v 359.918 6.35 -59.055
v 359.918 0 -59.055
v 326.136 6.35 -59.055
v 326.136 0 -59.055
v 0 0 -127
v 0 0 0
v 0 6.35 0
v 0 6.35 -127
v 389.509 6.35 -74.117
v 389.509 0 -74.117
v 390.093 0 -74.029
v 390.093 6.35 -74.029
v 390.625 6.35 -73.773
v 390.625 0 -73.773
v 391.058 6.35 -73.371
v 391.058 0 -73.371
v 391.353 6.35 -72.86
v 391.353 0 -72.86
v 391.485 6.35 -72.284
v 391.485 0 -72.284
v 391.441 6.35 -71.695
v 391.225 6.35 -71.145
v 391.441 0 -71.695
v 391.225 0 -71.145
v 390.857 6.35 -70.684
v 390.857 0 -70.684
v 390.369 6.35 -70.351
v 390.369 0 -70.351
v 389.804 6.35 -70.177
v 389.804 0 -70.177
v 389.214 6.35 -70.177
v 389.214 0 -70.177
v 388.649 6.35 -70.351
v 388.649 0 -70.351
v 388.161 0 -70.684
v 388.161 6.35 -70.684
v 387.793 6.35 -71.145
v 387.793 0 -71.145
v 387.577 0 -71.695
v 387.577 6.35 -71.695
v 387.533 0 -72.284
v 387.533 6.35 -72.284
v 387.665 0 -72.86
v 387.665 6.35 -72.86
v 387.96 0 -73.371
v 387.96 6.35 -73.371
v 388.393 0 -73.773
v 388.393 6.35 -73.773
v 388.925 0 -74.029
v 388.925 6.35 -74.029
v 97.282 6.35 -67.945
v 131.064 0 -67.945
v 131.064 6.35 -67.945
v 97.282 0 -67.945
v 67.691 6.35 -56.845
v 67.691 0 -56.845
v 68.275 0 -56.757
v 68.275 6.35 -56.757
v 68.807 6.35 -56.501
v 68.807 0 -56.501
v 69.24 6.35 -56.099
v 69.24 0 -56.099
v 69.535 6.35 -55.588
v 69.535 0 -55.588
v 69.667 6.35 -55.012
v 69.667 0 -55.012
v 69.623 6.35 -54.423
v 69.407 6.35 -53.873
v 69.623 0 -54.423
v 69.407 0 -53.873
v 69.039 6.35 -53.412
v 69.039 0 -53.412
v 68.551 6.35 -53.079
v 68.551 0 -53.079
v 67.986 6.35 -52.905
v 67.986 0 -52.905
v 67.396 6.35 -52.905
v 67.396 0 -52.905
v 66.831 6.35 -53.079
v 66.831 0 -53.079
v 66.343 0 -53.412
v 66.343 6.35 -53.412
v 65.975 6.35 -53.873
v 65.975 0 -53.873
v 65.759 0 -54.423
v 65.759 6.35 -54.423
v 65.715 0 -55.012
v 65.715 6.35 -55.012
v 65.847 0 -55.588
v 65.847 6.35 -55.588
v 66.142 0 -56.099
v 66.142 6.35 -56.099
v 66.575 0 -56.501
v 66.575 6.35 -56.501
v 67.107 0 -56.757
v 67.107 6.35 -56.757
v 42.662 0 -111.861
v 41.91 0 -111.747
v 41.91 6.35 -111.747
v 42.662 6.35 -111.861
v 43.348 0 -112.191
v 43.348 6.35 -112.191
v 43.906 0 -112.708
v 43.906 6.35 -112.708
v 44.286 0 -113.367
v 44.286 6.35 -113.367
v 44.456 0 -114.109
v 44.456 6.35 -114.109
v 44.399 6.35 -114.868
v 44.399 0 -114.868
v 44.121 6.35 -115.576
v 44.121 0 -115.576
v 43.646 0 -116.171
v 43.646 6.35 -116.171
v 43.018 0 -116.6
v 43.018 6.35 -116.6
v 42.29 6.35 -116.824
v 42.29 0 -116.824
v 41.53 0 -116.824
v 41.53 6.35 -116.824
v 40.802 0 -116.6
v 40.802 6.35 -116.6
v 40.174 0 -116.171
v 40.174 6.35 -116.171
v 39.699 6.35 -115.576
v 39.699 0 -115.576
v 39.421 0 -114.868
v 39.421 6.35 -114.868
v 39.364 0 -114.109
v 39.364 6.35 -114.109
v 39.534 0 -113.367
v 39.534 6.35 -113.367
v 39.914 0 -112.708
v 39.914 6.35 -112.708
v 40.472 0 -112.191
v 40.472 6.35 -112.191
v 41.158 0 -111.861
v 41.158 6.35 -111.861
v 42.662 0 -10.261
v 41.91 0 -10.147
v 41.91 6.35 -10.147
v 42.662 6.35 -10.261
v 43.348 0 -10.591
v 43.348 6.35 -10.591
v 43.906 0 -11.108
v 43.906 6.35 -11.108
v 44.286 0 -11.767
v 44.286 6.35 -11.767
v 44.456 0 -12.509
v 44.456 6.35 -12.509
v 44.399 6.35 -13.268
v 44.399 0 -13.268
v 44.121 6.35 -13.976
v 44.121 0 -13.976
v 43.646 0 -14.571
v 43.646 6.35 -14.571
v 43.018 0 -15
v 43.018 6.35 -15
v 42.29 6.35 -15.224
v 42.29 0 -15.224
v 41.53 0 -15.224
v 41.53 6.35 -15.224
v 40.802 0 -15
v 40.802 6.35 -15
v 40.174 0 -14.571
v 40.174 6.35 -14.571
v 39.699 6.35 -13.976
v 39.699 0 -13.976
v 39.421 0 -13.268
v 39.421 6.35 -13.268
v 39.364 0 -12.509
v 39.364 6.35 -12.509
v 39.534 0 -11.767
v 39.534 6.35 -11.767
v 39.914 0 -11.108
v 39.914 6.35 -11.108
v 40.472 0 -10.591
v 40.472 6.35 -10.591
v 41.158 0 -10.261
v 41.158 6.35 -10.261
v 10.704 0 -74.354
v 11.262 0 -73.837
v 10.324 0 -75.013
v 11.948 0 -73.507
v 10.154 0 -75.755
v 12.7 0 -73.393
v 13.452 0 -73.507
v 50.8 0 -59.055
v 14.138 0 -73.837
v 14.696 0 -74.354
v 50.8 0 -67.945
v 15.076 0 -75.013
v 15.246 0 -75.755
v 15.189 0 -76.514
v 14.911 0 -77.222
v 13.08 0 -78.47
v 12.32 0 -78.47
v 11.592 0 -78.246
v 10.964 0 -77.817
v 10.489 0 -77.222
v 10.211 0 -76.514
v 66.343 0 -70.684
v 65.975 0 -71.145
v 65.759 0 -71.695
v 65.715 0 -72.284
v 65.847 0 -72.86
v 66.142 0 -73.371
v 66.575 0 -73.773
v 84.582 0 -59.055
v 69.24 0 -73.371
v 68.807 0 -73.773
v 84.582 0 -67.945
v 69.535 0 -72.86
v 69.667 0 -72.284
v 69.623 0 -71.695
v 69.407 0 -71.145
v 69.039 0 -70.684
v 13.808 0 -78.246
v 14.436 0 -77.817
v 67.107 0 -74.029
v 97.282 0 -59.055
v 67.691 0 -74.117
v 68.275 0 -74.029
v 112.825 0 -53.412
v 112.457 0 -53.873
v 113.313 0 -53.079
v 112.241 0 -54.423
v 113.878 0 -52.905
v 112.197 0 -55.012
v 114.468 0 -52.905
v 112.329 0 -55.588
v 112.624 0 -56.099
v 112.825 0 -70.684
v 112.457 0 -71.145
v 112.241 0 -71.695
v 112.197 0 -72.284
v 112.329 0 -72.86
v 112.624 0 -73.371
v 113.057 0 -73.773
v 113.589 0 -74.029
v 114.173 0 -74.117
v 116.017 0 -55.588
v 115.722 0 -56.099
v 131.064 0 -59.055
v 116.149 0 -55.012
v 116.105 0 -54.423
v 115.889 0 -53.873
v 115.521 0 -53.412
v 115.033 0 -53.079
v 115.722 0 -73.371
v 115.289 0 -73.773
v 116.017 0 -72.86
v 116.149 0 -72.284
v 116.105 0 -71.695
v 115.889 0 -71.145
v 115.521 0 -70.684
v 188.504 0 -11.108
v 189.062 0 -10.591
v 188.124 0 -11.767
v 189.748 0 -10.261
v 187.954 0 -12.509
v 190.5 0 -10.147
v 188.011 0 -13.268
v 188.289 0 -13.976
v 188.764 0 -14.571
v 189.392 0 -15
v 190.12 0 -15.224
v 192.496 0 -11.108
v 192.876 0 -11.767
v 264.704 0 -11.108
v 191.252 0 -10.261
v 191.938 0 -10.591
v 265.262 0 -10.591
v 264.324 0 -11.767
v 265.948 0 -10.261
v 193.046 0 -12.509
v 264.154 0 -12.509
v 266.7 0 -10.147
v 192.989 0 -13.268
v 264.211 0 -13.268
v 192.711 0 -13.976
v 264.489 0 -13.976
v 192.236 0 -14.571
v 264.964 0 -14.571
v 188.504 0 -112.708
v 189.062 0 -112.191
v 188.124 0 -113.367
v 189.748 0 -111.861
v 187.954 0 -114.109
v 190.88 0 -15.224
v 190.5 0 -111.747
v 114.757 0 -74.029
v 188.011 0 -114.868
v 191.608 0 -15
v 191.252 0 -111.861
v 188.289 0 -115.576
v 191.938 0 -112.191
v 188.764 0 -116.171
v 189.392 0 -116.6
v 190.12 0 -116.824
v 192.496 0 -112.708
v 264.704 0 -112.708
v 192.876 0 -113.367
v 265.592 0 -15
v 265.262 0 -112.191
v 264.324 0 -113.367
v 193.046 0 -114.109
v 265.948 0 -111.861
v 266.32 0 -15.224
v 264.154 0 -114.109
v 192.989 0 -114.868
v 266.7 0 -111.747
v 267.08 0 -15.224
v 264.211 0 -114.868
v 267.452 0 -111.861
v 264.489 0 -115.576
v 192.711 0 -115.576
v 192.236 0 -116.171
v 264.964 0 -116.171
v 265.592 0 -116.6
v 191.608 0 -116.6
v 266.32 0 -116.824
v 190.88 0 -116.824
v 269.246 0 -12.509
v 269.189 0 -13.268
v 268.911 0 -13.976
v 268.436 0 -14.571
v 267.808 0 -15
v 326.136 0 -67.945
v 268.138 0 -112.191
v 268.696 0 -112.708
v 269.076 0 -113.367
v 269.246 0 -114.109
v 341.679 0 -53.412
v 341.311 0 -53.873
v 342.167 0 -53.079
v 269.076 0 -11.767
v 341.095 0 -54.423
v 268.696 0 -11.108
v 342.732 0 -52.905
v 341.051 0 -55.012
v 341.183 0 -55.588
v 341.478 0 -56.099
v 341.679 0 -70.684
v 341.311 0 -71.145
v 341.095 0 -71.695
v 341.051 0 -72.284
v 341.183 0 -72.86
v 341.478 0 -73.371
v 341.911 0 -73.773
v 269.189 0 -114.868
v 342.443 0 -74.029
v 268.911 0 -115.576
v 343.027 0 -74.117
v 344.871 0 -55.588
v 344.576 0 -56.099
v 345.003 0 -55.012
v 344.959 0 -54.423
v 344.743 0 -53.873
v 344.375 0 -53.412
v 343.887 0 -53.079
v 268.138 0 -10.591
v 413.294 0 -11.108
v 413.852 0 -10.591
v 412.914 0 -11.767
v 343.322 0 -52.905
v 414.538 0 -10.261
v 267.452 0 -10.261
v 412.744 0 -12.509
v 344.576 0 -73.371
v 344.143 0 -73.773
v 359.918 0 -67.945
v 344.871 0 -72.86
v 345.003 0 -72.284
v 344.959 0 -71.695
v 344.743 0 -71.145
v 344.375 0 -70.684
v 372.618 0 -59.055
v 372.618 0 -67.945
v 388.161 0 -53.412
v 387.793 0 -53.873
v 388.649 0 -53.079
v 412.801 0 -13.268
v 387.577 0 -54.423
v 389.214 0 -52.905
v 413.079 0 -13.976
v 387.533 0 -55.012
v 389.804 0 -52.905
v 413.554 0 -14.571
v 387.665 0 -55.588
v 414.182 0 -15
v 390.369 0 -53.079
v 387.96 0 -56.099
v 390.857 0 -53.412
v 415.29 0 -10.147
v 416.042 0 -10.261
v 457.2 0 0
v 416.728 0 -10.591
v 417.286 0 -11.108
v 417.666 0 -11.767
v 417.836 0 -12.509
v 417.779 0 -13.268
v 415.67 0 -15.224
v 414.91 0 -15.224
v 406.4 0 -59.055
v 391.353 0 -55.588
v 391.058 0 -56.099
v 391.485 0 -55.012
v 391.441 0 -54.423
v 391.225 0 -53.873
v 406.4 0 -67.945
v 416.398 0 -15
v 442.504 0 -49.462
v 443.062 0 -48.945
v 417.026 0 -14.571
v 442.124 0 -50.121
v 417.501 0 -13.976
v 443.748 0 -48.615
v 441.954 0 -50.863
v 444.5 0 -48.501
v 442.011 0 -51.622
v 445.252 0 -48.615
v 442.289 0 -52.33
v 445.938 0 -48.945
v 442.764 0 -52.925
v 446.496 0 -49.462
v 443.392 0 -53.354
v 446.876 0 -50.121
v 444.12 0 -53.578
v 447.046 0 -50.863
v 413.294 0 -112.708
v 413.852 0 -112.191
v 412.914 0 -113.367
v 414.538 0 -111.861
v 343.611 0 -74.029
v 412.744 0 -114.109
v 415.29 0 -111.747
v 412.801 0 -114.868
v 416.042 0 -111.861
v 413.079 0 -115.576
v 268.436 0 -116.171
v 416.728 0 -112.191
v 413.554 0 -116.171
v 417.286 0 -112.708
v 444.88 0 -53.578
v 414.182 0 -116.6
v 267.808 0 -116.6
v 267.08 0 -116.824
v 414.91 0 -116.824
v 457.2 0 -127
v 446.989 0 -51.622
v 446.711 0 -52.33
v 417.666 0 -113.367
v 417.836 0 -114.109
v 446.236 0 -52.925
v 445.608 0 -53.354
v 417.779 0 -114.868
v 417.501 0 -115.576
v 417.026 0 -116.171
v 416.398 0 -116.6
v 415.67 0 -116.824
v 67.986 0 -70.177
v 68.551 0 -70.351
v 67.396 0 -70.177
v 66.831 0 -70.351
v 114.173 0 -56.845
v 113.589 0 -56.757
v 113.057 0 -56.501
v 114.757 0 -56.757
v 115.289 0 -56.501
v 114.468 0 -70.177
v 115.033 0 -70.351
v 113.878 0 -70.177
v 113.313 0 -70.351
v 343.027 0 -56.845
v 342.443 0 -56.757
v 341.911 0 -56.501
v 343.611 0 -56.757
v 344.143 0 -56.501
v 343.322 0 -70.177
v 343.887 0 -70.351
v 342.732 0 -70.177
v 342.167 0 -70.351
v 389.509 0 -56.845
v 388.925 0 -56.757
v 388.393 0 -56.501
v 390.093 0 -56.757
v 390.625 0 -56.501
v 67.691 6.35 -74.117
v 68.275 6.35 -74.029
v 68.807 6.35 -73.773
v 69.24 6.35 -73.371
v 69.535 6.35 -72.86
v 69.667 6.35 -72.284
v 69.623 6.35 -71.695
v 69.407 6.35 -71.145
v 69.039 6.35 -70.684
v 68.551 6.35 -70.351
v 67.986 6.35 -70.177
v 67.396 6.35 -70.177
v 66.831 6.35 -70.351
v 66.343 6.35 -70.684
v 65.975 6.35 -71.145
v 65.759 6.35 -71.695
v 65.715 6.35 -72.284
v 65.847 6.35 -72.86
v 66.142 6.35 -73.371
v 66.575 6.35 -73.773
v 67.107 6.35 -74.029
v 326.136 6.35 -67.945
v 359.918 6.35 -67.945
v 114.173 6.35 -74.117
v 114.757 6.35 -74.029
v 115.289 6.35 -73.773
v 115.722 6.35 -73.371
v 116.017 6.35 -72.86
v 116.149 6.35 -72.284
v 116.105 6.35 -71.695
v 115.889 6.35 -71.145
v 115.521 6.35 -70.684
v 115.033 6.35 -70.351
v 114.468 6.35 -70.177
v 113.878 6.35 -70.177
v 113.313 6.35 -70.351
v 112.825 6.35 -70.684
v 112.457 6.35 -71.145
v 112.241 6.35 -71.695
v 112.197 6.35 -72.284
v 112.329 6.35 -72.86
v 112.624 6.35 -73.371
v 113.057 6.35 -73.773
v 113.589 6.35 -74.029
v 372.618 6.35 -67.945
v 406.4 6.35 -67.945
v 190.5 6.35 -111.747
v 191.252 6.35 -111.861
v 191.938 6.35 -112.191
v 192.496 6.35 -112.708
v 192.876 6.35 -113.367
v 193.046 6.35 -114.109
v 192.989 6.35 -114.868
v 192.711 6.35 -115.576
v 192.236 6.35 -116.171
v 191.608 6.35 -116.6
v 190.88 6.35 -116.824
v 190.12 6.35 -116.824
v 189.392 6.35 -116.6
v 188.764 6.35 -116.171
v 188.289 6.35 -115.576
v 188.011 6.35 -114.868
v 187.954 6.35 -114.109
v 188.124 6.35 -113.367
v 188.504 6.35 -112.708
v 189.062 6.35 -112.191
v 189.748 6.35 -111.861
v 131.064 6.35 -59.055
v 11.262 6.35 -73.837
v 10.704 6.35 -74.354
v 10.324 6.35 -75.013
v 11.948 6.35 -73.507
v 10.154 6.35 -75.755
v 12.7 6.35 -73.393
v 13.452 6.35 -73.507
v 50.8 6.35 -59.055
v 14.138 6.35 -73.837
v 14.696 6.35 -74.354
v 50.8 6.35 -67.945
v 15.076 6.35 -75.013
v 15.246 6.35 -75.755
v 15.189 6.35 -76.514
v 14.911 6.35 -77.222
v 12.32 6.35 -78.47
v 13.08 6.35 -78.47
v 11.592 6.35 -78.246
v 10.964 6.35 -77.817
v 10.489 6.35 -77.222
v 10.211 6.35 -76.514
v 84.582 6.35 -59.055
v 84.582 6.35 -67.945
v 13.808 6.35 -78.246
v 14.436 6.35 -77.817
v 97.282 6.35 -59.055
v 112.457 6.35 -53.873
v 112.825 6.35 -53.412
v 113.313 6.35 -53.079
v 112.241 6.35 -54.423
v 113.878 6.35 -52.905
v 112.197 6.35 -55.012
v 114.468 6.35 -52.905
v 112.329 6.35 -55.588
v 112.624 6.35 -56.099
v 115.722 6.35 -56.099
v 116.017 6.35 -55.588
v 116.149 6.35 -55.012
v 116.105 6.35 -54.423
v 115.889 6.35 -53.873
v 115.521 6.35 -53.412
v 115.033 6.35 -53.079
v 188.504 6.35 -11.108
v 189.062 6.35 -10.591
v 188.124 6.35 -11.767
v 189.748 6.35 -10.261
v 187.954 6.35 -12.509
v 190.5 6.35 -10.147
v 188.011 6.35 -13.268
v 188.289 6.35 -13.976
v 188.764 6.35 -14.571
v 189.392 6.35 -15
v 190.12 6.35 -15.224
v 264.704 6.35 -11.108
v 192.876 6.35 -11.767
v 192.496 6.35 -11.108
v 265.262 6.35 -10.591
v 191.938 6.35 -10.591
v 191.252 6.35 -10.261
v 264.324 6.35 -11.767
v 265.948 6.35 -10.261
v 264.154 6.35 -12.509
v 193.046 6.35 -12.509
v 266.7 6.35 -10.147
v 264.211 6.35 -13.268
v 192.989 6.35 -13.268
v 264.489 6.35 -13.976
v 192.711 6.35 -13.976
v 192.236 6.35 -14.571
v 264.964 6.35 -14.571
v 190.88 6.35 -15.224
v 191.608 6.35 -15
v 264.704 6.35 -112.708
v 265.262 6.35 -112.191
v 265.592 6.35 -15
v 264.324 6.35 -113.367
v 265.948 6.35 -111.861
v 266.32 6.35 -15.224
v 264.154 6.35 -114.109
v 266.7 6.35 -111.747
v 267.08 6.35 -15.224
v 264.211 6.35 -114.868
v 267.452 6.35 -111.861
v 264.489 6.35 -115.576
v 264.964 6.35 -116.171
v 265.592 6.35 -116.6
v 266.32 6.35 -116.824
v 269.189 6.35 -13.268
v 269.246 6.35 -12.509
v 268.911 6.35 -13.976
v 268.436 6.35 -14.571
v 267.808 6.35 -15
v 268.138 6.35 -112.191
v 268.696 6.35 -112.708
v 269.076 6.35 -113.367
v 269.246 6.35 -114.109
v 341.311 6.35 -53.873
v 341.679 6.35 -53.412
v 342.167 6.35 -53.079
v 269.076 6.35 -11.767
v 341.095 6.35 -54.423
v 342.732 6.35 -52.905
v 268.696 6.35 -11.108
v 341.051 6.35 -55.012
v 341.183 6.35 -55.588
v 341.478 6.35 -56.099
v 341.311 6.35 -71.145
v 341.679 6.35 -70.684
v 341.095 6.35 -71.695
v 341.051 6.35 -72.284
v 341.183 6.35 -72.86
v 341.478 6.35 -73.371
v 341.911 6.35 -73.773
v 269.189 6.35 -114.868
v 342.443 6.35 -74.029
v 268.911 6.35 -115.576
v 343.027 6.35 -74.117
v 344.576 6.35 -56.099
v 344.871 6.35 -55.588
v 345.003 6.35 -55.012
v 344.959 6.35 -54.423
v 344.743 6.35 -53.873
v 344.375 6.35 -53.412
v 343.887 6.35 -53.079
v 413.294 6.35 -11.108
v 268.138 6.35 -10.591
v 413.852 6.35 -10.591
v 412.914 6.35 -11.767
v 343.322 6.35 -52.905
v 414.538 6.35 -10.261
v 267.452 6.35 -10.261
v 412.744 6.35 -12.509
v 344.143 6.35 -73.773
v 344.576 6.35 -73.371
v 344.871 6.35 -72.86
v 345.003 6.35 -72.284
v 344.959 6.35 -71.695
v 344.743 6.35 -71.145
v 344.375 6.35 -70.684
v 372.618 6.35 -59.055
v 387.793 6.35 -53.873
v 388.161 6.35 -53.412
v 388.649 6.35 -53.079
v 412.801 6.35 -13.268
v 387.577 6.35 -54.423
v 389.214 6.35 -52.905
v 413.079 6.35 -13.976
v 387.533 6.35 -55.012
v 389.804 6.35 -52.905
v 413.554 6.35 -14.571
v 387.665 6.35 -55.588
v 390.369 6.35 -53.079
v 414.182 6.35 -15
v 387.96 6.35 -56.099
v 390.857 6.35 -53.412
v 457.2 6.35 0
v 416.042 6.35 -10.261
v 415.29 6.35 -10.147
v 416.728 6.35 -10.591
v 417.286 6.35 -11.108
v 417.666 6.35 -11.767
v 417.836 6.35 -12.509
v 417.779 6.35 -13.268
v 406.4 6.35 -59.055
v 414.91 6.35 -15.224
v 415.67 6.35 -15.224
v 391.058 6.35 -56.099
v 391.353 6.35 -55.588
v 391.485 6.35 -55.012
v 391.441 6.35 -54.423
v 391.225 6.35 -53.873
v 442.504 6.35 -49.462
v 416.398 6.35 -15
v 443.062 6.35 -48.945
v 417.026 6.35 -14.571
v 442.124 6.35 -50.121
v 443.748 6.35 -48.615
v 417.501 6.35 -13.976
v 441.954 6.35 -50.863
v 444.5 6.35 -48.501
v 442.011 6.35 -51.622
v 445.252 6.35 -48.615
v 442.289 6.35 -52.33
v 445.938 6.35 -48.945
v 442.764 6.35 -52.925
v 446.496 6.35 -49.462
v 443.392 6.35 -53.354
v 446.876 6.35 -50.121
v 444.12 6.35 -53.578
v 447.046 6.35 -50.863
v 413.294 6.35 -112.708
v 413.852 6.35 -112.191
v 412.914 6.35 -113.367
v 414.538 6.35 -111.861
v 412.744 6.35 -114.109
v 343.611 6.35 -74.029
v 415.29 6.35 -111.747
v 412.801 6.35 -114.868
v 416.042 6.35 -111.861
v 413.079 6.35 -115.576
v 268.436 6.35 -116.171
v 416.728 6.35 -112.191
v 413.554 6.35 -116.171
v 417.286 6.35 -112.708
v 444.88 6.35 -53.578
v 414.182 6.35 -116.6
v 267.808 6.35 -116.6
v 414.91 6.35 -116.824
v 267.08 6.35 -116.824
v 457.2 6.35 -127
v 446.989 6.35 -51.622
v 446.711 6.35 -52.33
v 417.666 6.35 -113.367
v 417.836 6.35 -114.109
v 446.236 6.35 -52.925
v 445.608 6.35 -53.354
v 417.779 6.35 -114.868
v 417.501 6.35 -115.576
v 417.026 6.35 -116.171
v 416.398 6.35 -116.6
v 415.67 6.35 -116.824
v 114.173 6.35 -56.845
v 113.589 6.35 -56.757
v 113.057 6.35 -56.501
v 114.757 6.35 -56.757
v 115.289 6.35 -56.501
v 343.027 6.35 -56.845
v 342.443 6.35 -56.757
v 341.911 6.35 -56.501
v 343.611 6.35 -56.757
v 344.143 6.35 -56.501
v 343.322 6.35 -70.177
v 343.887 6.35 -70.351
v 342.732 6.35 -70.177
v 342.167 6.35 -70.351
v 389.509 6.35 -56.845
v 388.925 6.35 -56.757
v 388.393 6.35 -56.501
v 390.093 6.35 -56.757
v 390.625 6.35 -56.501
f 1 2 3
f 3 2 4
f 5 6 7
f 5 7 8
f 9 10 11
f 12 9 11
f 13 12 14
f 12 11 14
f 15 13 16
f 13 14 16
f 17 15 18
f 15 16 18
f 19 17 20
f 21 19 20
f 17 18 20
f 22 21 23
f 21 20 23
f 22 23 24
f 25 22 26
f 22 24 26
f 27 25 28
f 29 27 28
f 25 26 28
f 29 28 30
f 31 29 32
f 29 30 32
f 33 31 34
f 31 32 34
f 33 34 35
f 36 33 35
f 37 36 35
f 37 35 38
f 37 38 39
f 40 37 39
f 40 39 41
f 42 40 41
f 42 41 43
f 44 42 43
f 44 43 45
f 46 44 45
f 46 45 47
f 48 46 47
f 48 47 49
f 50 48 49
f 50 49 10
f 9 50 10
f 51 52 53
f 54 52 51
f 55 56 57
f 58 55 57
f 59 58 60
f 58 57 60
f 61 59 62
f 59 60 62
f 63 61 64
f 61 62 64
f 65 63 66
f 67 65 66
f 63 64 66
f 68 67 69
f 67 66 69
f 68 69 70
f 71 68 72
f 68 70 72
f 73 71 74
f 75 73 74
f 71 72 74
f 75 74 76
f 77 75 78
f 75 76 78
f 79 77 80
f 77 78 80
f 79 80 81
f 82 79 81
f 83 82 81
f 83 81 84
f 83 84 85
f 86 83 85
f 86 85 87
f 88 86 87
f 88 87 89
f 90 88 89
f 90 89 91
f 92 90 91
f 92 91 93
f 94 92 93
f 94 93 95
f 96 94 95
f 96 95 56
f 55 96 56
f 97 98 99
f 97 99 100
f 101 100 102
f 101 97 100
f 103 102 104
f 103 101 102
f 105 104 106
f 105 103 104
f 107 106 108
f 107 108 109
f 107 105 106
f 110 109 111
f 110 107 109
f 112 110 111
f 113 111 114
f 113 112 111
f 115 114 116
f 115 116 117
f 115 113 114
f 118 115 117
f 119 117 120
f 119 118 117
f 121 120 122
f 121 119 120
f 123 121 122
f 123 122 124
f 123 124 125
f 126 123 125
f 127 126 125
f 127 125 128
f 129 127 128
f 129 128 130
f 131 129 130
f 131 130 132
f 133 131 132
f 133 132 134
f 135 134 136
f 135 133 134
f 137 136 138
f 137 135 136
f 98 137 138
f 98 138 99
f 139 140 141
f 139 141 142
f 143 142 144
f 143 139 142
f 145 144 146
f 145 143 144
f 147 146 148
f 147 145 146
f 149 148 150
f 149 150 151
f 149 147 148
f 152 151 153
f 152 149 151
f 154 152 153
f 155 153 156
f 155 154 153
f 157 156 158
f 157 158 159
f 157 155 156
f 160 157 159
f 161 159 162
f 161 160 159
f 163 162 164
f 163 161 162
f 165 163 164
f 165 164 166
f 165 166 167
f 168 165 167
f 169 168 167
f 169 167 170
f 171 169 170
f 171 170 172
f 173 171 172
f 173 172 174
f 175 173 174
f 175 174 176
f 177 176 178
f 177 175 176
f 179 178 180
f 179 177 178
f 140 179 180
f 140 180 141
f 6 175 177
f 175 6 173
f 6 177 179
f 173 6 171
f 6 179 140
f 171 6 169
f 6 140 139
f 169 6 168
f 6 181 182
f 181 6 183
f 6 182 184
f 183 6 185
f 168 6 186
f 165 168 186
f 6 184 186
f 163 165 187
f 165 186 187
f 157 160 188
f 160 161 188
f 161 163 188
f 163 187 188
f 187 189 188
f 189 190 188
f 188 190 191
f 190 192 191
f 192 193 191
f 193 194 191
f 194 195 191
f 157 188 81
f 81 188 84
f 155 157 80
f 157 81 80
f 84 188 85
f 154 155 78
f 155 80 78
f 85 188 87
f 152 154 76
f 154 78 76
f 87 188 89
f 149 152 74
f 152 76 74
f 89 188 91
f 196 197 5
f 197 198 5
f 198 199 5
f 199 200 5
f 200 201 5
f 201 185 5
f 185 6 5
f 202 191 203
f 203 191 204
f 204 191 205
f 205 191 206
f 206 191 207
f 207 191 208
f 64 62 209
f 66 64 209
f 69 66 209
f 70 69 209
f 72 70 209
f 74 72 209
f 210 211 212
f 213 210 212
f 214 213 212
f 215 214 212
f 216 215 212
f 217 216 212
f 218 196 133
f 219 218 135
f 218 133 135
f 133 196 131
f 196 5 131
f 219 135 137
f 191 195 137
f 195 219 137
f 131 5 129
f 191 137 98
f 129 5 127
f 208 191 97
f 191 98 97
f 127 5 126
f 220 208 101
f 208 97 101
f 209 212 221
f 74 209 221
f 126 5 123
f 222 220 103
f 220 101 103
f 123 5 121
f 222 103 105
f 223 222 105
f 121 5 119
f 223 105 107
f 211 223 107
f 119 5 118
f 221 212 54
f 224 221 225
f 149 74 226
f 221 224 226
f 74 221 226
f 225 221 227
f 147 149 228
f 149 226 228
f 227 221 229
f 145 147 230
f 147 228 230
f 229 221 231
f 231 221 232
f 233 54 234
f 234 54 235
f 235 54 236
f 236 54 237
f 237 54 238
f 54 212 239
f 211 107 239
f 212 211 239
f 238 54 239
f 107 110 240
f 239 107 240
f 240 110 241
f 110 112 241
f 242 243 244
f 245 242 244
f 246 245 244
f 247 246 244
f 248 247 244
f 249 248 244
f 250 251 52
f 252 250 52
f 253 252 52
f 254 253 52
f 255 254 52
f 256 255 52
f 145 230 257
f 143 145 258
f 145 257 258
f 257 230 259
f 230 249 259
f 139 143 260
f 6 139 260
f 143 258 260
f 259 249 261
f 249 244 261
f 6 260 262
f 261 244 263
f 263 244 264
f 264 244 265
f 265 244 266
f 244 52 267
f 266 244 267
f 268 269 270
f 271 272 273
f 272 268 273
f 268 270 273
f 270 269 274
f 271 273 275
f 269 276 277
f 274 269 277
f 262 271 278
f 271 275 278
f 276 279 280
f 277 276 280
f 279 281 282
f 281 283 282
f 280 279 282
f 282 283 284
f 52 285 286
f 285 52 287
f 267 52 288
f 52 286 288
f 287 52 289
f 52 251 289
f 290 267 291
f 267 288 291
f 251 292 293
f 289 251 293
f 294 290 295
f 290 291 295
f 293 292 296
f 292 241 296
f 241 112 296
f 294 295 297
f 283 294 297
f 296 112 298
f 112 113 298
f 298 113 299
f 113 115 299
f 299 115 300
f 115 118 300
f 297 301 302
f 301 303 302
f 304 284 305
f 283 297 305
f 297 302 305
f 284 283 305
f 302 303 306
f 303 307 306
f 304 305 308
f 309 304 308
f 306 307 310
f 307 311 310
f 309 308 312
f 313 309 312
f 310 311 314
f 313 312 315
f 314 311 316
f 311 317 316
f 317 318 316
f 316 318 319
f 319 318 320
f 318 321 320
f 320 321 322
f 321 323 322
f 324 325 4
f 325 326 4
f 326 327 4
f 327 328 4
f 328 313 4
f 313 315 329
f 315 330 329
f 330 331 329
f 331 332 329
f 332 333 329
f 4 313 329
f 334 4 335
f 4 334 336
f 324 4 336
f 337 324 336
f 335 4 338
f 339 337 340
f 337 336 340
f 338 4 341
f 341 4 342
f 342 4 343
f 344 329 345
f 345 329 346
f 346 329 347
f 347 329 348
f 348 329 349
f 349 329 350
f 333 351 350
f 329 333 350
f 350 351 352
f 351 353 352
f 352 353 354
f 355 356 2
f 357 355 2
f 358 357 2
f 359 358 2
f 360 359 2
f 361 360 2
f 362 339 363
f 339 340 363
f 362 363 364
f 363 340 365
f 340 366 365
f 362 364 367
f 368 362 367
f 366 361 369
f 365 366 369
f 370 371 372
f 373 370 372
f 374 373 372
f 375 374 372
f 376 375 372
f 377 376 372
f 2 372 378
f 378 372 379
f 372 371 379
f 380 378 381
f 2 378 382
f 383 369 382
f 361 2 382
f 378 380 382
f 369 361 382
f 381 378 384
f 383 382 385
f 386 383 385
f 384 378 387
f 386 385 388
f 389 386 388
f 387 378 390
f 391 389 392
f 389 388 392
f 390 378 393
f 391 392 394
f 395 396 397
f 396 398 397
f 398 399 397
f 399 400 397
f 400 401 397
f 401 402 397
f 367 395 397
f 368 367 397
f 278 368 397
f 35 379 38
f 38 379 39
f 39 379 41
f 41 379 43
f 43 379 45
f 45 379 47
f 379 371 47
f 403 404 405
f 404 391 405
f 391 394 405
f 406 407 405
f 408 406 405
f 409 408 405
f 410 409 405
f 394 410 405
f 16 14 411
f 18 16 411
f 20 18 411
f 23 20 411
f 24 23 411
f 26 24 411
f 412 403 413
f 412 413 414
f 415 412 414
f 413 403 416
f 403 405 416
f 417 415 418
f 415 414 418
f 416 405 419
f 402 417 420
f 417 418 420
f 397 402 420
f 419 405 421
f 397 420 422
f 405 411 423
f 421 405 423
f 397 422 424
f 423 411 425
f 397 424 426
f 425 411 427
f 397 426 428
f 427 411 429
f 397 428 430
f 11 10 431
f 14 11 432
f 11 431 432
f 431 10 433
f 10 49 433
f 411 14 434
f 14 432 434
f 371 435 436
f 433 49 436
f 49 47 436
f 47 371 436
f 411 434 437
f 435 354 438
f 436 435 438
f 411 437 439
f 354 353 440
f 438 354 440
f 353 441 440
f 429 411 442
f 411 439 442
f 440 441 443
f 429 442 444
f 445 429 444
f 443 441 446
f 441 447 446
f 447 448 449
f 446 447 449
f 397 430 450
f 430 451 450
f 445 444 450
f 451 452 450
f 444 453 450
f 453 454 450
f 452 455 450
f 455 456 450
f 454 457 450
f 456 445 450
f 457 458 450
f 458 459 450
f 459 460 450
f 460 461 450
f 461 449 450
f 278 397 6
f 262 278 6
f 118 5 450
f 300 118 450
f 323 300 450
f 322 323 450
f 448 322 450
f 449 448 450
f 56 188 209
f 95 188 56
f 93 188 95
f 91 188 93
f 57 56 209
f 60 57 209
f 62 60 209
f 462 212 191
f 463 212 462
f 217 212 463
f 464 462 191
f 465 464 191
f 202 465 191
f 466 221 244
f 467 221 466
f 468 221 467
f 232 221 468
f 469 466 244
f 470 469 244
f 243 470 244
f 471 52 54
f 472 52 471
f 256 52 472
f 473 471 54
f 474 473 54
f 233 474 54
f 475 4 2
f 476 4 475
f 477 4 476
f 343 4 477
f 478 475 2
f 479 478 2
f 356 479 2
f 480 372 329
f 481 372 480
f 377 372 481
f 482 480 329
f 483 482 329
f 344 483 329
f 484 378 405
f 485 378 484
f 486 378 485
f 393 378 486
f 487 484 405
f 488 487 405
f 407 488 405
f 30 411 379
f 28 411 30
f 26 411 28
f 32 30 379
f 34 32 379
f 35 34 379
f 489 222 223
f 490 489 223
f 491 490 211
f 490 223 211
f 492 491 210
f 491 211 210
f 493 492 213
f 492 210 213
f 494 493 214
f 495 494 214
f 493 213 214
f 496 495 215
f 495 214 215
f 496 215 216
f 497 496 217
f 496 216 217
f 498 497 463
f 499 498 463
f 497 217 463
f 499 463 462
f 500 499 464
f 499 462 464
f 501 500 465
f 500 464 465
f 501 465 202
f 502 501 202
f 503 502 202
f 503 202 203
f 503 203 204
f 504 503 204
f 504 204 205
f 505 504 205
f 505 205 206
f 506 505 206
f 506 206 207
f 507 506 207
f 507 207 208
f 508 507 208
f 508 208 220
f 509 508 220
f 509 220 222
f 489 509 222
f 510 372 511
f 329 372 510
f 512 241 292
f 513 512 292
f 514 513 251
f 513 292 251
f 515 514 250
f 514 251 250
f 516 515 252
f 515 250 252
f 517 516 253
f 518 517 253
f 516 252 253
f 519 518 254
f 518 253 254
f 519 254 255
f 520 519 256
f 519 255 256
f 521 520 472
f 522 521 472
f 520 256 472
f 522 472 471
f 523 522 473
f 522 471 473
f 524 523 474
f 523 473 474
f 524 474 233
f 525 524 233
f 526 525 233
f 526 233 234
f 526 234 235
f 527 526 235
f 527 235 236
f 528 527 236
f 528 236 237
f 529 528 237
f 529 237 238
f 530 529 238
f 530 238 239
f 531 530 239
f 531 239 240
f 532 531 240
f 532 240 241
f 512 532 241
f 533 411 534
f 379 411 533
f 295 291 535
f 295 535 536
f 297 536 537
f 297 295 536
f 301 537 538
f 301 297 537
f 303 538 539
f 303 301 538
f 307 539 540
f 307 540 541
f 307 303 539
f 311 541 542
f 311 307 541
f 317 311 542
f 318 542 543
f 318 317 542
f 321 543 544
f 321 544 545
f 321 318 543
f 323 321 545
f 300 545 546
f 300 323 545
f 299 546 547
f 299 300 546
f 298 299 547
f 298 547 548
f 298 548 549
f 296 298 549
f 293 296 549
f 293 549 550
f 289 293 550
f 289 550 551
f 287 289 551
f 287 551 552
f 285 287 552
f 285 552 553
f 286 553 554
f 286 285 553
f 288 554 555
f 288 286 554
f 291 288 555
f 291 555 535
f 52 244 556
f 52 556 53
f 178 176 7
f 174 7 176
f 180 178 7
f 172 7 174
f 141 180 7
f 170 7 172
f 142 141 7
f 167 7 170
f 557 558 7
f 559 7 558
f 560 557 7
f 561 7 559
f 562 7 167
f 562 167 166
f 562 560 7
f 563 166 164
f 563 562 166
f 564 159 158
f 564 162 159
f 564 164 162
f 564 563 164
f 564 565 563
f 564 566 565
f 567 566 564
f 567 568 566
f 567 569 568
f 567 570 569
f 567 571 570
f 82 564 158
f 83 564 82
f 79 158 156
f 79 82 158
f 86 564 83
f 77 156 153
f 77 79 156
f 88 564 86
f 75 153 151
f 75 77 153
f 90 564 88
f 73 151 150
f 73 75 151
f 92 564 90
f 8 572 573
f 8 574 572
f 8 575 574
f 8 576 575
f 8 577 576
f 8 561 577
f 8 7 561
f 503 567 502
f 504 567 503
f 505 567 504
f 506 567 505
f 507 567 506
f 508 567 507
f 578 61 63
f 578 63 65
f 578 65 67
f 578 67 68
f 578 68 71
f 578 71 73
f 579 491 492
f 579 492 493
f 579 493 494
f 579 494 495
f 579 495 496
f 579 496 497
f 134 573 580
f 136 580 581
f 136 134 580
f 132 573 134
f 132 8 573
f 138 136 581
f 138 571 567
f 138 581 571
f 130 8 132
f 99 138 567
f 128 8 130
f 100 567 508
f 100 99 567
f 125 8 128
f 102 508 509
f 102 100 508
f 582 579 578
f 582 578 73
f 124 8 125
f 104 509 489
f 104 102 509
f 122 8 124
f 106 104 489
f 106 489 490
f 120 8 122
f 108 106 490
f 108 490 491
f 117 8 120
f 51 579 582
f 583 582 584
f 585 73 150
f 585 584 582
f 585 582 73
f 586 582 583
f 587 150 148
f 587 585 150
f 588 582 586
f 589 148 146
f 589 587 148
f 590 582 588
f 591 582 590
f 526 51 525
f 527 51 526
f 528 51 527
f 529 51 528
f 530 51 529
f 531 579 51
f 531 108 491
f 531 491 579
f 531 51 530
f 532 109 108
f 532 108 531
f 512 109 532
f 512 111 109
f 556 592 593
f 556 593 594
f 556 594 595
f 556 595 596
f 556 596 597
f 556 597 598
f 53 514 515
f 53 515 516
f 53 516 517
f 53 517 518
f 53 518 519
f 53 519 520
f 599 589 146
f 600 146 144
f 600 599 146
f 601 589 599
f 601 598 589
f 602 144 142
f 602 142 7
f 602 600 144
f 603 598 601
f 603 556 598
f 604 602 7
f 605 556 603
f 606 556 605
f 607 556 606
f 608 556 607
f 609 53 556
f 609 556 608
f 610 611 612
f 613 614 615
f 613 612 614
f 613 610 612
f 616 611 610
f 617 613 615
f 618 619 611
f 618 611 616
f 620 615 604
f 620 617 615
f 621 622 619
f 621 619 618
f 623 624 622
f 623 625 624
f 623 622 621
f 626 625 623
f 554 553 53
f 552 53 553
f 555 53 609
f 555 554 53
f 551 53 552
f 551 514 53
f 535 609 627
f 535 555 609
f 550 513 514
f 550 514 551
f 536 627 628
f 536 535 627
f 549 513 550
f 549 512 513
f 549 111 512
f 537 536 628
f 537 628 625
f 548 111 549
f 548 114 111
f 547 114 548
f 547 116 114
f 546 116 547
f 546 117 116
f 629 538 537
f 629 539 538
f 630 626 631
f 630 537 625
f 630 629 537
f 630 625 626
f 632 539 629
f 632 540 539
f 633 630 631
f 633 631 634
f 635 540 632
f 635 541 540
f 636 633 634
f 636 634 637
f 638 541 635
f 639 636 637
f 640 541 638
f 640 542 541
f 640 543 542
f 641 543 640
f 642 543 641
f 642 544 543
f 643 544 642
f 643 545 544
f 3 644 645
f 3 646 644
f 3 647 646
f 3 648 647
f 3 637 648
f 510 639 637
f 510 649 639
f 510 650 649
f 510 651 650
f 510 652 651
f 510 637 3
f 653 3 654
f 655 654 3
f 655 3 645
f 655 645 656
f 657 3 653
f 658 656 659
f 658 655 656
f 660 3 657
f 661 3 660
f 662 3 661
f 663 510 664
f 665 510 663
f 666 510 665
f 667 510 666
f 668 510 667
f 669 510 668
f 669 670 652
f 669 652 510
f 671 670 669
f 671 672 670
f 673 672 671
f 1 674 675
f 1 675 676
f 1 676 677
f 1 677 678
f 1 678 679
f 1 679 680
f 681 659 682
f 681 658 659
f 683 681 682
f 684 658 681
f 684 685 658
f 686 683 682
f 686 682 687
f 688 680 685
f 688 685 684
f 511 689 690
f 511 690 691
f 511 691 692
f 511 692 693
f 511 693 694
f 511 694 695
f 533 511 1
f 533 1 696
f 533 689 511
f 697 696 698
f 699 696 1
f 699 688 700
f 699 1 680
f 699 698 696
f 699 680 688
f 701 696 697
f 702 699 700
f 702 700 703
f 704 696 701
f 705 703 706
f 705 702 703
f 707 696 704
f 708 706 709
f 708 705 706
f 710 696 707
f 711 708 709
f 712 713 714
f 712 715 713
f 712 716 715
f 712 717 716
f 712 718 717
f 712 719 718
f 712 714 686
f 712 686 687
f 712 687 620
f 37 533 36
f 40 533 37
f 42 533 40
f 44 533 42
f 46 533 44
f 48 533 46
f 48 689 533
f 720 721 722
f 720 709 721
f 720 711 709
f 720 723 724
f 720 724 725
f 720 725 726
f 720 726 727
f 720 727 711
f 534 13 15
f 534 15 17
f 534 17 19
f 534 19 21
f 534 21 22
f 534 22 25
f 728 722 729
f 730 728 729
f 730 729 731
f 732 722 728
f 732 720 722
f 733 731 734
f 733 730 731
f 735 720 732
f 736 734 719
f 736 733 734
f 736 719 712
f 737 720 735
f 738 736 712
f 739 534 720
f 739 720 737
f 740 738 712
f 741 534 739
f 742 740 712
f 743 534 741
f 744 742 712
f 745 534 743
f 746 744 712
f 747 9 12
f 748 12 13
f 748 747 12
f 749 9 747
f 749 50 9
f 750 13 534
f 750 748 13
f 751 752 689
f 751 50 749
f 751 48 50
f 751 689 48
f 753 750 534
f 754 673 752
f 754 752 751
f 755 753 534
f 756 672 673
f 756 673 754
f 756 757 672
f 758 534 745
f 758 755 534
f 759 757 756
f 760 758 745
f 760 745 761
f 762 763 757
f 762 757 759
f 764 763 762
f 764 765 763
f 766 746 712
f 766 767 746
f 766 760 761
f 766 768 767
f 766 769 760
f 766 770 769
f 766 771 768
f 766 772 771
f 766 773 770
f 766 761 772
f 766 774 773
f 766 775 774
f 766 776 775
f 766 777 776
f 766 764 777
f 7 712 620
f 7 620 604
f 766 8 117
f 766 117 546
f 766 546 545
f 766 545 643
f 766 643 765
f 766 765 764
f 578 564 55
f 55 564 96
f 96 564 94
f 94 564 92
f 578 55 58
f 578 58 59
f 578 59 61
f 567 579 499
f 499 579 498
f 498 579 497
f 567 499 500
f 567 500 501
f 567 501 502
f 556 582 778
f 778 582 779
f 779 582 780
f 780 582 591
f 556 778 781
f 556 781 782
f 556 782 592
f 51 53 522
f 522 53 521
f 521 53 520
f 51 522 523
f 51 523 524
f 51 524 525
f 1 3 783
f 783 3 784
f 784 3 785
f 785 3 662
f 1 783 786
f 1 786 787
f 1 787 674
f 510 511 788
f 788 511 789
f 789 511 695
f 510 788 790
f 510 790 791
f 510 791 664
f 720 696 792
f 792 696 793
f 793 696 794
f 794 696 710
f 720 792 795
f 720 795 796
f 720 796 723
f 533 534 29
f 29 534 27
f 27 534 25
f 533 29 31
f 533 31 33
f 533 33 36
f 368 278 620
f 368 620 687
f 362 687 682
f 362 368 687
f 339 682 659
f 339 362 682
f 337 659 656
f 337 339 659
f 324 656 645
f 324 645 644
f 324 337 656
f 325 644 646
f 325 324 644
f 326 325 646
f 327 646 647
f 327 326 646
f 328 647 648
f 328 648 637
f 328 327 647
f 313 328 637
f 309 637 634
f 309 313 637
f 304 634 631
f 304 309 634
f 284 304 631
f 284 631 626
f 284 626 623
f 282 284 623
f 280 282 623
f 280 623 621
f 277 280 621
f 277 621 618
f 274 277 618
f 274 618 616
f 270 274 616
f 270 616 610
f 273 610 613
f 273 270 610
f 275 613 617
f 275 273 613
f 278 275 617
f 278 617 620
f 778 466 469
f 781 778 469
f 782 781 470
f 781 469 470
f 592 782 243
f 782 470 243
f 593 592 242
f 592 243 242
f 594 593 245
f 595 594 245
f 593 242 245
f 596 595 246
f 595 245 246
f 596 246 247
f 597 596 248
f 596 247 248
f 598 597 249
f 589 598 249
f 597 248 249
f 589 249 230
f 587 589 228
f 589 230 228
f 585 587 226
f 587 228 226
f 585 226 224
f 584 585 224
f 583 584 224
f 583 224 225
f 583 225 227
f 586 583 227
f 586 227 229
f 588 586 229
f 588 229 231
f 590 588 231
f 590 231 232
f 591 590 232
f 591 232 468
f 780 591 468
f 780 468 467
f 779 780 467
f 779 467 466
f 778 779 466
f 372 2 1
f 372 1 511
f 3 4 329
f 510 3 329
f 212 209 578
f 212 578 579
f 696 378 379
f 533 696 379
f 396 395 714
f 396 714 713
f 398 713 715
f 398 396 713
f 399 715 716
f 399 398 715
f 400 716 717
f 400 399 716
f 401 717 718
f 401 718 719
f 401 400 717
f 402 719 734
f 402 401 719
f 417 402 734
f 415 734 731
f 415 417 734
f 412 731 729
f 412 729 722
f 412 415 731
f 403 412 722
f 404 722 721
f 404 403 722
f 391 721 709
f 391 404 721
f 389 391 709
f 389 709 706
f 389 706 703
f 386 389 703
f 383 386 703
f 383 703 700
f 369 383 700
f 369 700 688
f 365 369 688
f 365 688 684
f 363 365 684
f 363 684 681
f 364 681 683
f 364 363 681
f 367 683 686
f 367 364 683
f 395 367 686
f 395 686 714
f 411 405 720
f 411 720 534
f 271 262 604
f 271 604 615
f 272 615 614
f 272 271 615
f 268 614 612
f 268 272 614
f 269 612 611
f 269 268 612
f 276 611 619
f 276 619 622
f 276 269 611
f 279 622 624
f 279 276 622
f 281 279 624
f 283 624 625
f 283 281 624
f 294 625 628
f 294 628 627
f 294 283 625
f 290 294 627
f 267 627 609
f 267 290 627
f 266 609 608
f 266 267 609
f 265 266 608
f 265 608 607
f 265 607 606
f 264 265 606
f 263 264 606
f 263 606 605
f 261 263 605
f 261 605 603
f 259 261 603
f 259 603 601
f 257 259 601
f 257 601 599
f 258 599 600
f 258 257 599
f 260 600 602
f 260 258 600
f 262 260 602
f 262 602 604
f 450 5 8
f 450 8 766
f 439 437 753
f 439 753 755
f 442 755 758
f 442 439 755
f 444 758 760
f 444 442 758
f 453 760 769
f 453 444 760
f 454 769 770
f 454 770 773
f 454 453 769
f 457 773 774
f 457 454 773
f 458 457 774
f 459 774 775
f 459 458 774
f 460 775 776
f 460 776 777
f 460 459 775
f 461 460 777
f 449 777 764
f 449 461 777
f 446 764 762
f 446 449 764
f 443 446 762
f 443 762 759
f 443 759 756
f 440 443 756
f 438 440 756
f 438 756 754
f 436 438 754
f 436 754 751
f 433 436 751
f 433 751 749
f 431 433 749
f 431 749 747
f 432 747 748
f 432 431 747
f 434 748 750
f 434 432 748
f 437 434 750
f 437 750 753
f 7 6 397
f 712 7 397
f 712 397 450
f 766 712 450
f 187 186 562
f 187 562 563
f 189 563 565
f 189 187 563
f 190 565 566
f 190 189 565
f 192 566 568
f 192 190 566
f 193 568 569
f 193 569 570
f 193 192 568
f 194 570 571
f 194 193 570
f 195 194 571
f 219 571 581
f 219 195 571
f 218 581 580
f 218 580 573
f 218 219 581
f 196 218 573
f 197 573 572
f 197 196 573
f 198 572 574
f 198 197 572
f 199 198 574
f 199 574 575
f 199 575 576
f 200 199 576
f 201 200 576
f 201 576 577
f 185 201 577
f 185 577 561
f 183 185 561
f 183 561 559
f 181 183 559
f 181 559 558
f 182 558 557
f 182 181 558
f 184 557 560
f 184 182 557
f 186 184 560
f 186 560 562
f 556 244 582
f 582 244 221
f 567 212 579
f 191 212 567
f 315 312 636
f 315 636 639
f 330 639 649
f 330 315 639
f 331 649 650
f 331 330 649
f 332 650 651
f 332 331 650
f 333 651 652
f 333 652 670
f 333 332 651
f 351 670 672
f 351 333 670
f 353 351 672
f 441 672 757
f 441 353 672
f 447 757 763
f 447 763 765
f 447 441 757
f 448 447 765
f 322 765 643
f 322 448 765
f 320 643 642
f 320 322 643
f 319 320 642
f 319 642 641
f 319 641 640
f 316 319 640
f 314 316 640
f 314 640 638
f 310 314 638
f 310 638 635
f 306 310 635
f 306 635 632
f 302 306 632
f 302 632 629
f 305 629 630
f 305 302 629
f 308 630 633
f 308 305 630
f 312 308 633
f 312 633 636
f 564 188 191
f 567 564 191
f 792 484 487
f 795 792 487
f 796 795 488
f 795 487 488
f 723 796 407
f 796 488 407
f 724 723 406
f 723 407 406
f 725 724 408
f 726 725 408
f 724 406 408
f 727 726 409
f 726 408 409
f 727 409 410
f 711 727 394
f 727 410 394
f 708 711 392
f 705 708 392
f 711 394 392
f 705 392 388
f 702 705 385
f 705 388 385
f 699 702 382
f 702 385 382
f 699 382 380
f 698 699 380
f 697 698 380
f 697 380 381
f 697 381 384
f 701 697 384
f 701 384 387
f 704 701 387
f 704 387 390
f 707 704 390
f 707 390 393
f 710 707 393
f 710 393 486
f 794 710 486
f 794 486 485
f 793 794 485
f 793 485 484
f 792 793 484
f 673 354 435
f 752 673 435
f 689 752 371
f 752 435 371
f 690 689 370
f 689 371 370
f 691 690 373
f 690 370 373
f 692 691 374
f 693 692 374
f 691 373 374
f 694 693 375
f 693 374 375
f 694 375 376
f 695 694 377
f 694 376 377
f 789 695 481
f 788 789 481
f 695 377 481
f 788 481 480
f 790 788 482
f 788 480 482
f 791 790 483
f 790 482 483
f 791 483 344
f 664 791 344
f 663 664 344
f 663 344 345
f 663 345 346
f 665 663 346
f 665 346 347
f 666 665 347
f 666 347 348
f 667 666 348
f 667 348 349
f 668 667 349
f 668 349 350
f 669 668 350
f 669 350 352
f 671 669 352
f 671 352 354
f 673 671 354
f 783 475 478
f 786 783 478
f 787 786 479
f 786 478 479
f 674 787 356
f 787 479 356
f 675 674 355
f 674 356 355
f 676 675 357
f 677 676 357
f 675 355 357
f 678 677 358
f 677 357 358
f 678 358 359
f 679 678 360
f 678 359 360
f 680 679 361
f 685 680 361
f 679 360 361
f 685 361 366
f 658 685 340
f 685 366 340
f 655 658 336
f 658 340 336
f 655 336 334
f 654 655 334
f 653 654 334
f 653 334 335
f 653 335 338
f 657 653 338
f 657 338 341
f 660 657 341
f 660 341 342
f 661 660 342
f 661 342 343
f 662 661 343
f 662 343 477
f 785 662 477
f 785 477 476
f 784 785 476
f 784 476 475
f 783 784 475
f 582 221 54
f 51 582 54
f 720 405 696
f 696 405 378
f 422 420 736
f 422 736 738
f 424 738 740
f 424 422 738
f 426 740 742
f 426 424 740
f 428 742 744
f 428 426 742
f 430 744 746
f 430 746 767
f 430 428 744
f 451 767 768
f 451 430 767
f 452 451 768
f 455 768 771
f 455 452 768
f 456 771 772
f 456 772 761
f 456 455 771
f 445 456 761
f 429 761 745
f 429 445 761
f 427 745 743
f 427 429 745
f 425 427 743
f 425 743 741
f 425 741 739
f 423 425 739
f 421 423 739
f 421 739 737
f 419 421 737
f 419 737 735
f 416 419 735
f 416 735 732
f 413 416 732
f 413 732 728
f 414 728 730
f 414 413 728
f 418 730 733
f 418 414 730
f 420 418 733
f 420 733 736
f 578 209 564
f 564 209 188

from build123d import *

# Parameters (mm, degrees)
SKETCH1_W           = 457.2
SKETCH1_H           = 127
SKETCH1_R           = 2.5527
BOSS_EXTRUDE1_DEPTH = 6.35
CUT_EXTRUDE1_REACH  = 476.554
SKETCH2_R           = 1.9812
SKETCH2_W           = 33.782
SKETCH2_H           = 8.89


with BuildPart() as part:
    # Sketch1 → Boss-Extrude1 (new body)
    with BuildSketch(Plane(origin=(0, 0, 0), x_dir=(1, 0, 0), z_dir=(0, 1, 0))):
        with Locations((228.6, 63.5)):
            Rectangle(SKETCH1_W, SKETCH1_H)
        with Locations(Location((41.91, 114.3, 0), (0, 0, 270))):
            Circle(SKETCH1_R, mode=Mode.SUBTRACT)
        with Locations(Location((415.29, 114.3, 0), (0, 0, 270))):
            Circle(SKETCH1_R, mode=Mode.SUBTRACT)
        with Locations(Location((415.29, 12.7, 0), (0, 0, 270))):
            Circle(SKETCH1_R, mode=Mode.SUBTRACT)
        with Locations(Location((41.91, 12.7, 0), (0, 0, 270))):
            Circle(SKETCH1_R, mode=Mode.SUBTRACT)
        with Locations(Location((190.5, 114.3, 0), (0, 0, 270))):
            Circle(SKETCH1_R, mode=Mode.SUBTRACT)
        with Locations(Location((266.7, 114.3, 0), (0, 0, 270))):
            Circle(SKETCH1_R, mode=Mode.SUBTRACT)
        with Locations(Location((190.5, 12.7, 0), (0, 0, 270))):
            Circle(SKETCH1_R, mode=Mode.SUBTRACT)
        with Locations(Location((266.7, 12.7, 0), (0, 0, 270))):
            Circle(SKETCH1_R, mode=Mode.SUBTRACT)
        with Locations(Location((444.5, 51.054, 0), (0, 0, 270))):
            Circle(SKETCH1_R, mode=Mode.SUBTRACT)
        with Locations(Location((12.7, 75.946, 0), (0, 0, 270))):
            Circle(SKETCH1_R, mode=Mode.SUBTRACT)
    extrude(amount=BOSS_EXTRUDE1_DEPTH)

    # Sketch2 → Cut-Extrude1 (cut, up to next)
    with BuildSketch(Plane(origin=(0, 0, 0), x_dir=(-1, 0, 0), z_dir=(0, -1, 0)), mode=Mode.PRIVATE) as cut_extrude1_sk1:
        with Locations(Location((-389.509, 54.864, 0), (0, 0, 90))):
            Circle(SKETCH2_R)
    cut_extrude1_tool1 = extrude(cut_extrude1_sk1.sketch, amount=-CUT_EXTRUDE1_REACH, mode=Mode.PRIVATE) & part.part
    # Sketch2 → Cut-Extrude1 (cut, up to next)
    with BuildSketch(Plane(origin=(0, 0, 0), x_dir=(-1, 0, 0), z_dir=(0, -1, 0)), mode=Mode.PRIVATE) as cut_extrude1_sk2:
        with Locations(Location((-389.509, 72.136, 0), (0, 0, 90))):
            Circle(SKETCH2_R)
    cut_extrude1_tool2 = extrude(cut_extrude1_sk2.sketch, amount=-CUT_EXTRUDE1_REACH, mode=Mode.PRIVATE) & part.part
    # Sketch2 → Cut-Extrude1 (cut, up to next)
    with BuildSketch(Plane(origin=(0, 0, 0), x_dir=(-1, 0, 0), z_dir=(0, -1, 0)), mode=Mode.PRIVATE) as cut_extrude1_sk3:
        with Locations(Location((-343.027, 54.864, 0), (0, 0, 90))):
            Circle(SKETCH2_R)
    cut_extrude1_tool3 = extrude(cut_extrude1_sk3.sketch, amount=-CUT_EXTRUDE1_REACH, mode=Mode.PRIVATE) & part.part
    # Sketch2 → Cut-Extrude1 (cut, up to next)
    with BuildSketch(Plane(origin=(0, 0, 0), x_dir=(-1, 0, 0), z_dir=(0, -1, 0)), mode=Mode.PRIVATE) as cut_extrude1_sk4:
        with Locations(Location((-343.027, 72.136, 0), (0, 0, 90))):
            Circle(SKETCH2_R)
    cut_extrude1_tool4 = extrude(cut_extrude1_sk4.sketch, amount=-CUT_EXTRUDE1_REACH, mode=Mode.PRIVATE) & part.part
    # Sketch2 → Cut-Extrude1 (cut, up to next)
    with BuildSketch(Plane(origin=(0, 0, 0), x_dir=(-1, 0, 0), z_dir=(0, -1, 0)), mode=Mode.PRIVATE) as cut_extrude1_sk5:
        with Locations(Location((-114.173, 54.864, 0), (0, 0, 90))):
            Circle(SKETCH2_R)
    cut_extrude1_tool5 = extrude(cut_extrude1_sk5.sketch, amount=-CUT_EXTRUDE1_REACH, mode=Mode.PRIVATE) & part.part
    # Sketch2 → Cut-Extrude1 (cut, up to next)
    with BuildSketch(Plane(origin=(0, 0, 0), x_dir=(-1, 0, 0), z_dir=(0, -1, 0)), mode=Mode.PRIVATE) as cut_extrude1_sk6:
        with Locations(Location((-114.173, 72.136, 0), (0, 0, 90))):
            Circle(SKETCH2_R)
    cut_extrude1_tool6 = extrude(cut_extrude1_sk6.sketch, amount=-CUT_EXTRUDE1_REACH, mode=Mode.PRIVATE) & part.part
    # Sketch2 → Cut-Extrude1 (cut, up to next)
    with BuildSketch(Plane(origin=(0, 0, 0), x_dir=(-1, 0, 0), z_dir=(0, -1, 0)), mode=Mode.PRIVATE) as cut_extrude1_sk7:
        with Locations(Location((-67.691, 54.864, 0), (0, 0, 90))):
            Circle(SKETCH2_R)
    cut_extrude1_tool7 = extrude(cut_extrude1_sk7.sketch, amount=-CUT_EXTRUDE1_REACH, mode=Mode.PRIVATE) & part.part
    # Sketch2 → Cut-Extrude1 (cut, up to next)
    with BuildSketch(Plane(origin=(0, 0, 0), x_dir=(-1, 0, 0), z_dir=(0, -1, 0)), mode=Mode.PRIVATE) as cut_extrude1_sk8:
        with Locations(Location((-67.691, 72.136, 0), (0, 0, 90))):
            Circle(SKETCH2_R)
    cut_extrude1_tool8 = extrude(cut_extrude1_sk8.sketch, amount=-CUT_EXTRUDE1_REACH, mode=Mode.PRIVATE) & part.part
    # Sketch2 → Cut-Extrude1 (cut, up to next)
    with BuildSketch(Plane(origin=(0, 0, 0), x_dir=(-1, 0, 0), z_dir=(0, -1, 0)), mode=Mode.PRIVATE) as cut_extrude1_sk9:
        with Locations((-114.173, 63.5)):
            Rectangle(SKETCH2_W, SKETCH2_H)
    cut_extrude1_tool9 = extrude(cut_extrude1_sk9.sketch, amount=-CUT_EXTRUDE1_REACH, mode=Mode.PRIVATE) & part.part
    # Sketch2 → Cut-Extrude1 (cut, up to next)
    with BuildSketch(Plane(origin=(0, 0, 0), x_dir=(-1, 0, 0), z_dir=(0, -1, 0)), mode=Mode.PRIVATE) as cut_extrude1_sk10:
        with Locations((-389.509, 63.5)):
            Rectangle(SKETCH2_W, SKETCH2_H)
    cut_extrude1_tool10 = extrude(cut_extrude1_sk10.sketch, amount=-CUT_EXTRUDE1_REACH, mode=Mode.PRIVATE) & part.part
    # Sketch2 → Cut-Extrude1 (cut, up to next)
    with BuildSketch(Plane(origin=(0, 0, 0), x_dir=(-1, 0, 0), z_dir=(0, -1, 0)), mode=Mode.PRIVATE) as cut_extrude1_sk11:
        with Locations((-343.027, 63.5)):
            Rectangle(SKETCH2_W, SKETCH2_H)
    cut_extrude1_tool11 = extrude(cut_extrude1_sk11.sketch, amount=-CUT_EXTRUDE1_REACH, mode=Mode.PRIVATE) & part.part
    # Sketch2 → Cut-Extrude1 (cut, up to next)
    with BuildSketch(Plane(origin=(0, 0, 0), x_dir=(-1, 0, 0), z_dir=(0, -1, 0)), mode=Mode.PRIVATE) as cut_extrude1_sk12:
        with Locations((-67.691, 63.5)):
            Rectangle(SKETCH2_W, SKETCH2_H)
    cut_extrude1_tool12 = extrude(cut_extrude1_sk12.sketch, amount=-CUT_EXTRUDE1_REACH, mode=Mode.PRIVATE) & part.part
    add(cut_extrude1_tool1.solids().sort_by_distance((389.509, 0, -54.864))[0], mode=Mode.SUBTRACT)
    add(cut_extrude1_tool2.solids().sort_by_distance((389.509, 0, -72.136))[0], mode=Mode.SUBTRACT)
    add(cut_extrude1_tool3.solids().sort_by_distance((343.027, 0, -54.864))[0], mode=Mode.SUBTRACT)
    add(cut_extrude1_tool4.solids().sort_by_distance((343.027, 0, -72.136))[0], mode=Mode.SUBTRACT)
    add(cut_extrude1_tool5.solids().sort_by_distance((114.173, 0, -54.864))[0], mode=Mode.SUBTRACT)
    add(cut_extrude1_tool6.solids().sort_by_distance((114.173, 0, -72.136))[0], mode=Mode.SUBTRACT)
    add(cut_extrude1_tool7.solids().sort_by_distance((67.691, 0, -54.864))[0], mode=Mode.SUBTRACT)
    add(cut_extrude1_tool8.solids().sort_by_distance((67.691, 0, -72.136))[0], mode=Mode.SUBTRACT)
    add(cut_extrude1_tool9.solids().sort_by_distance((114.173, 0, -63.5))[0], mode=Mode.SUBTRACT)
    add(cut_extrude1_tool10.solids().sort_by_distance((389.509, 0, -63.5))[0], mode=Mode.SUBTRACT)
    add(cut_extrude1_tool11.solids().sort_by_distance((343.027, 0, -63.5))[0], mode=Mode.SUBTRACT)
    add(cut_extrude1_tool12.solids().sort_by_distance((67.691, 0, -63.5))[0], mode=Mode.SUBTRACT)


solid = part.part
